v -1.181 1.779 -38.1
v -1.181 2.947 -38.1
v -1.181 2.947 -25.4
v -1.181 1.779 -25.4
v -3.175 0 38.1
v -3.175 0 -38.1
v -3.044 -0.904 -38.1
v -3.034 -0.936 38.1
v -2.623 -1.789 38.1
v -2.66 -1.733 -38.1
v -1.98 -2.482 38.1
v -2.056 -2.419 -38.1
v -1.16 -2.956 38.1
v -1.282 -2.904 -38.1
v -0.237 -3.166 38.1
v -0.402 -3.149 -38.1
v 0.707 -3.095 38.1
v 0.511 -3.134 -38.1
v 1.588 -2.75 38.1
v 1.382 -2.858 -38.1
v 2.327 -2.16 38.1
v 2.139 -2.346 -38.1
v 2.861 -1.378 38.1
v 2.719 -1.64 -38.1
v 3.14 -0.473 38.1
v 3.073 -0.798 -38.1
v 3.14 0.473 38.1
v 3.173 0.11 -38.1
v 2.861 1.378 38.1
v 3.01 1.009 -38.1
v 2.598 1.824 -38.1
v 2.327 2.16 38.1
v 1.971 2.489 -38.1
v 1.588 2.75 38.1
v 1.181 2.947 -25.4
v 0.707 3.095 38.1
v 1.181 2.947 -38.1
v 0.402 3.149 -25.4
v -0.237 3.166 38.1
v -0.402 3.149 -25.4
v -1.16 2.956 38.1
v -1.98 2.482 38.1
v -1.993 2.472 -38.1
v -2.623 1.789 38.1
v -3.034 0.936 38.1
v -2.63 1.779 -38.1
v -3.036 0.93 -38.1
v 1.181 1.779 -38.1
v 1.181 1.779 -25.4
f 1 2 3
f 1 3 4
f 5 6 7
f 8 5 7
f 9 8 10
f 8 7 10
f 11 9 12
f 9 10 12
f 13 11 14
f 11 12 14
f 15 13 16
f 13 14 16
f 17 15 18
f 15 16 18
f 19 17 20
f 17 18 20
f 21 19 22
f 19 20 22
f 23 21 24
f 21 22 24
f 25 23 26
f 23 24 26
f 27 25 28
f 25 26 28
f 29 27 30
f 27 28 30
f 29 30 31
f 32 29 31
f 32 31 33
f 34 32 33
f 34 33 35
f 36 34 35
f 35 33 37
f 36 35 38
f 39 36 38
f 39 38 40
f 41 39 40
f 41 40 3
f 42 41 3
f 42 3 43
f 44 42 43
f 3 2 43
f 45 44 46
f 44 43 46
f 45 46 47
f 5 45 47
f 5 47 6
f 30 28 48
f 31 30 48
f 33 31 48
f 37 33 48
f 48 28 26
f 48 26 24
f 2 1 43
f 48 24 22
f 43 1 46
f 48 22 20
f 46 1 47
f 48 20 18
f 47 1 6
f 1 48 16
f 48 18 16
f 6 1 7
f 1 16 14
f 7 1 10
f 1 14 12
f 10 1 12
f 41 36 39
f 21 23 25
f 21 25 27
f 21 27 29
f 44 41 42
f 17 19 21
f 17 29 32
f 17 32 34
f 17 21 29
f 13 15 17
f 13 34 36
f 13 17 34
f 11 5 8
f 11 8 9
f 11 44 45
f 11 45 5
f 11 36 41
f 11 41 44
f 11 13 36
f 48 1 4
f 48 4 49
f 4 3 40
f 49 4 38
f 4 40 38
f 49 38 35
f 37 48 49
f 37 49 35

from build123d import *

# Parameters (mm, degrees)
BOSS_EXTRUDE1_DEPTH      = 38.1
BOSS_EXTRUDE1_DEPTH_BACK = 38.1
SKETCH2_R                = 3.175
CUT_EXTRUDE1_DEPTH       = 12.7


with BuildPart() as part:
    # Sketch2 → Boss-Extrude1 (new, two sides: drawn at the far end of the back side and taken through both)
    with BuildSketch(Plane.XY.offset(-BOSS_EXTRUDE1_DEPTH_BACK)):
        with Locations(Location((0, 0, 0), (0, 0, 180))):
            Circle(SKETCH2_R)
    extrude(amount=BOSS_EXTRUDE1_DEPTH + BOSS_EXTRUDE1_DEPTH_BACK)

    # Sketch3 → Cut-Extrude1 (cut)
    with BuildSketch(Plane(origin=(0, 0, -38.1), x_dir=(-1, 0, 0), z_dir=(0, 0, -1))):
        with BuildLine():
            Line((1.1811, 2.947138916), (1.1811, 1.778738916))
            Line((1.1811, 1.778738916), (-1.1811, 1.778738916))
            Line((-1.1811, 1.778738916), (-1.1811, 2.947138916))
            ThreePointArc((-1.1811, 2.947138916), (0, 3.175), (1.1811, 2.947138916))
        make_face()
    extrude(amount=-CUT_EXTRUDE1_DEPTH, mode=Mode.SUBTRACT)


solid = part.part
